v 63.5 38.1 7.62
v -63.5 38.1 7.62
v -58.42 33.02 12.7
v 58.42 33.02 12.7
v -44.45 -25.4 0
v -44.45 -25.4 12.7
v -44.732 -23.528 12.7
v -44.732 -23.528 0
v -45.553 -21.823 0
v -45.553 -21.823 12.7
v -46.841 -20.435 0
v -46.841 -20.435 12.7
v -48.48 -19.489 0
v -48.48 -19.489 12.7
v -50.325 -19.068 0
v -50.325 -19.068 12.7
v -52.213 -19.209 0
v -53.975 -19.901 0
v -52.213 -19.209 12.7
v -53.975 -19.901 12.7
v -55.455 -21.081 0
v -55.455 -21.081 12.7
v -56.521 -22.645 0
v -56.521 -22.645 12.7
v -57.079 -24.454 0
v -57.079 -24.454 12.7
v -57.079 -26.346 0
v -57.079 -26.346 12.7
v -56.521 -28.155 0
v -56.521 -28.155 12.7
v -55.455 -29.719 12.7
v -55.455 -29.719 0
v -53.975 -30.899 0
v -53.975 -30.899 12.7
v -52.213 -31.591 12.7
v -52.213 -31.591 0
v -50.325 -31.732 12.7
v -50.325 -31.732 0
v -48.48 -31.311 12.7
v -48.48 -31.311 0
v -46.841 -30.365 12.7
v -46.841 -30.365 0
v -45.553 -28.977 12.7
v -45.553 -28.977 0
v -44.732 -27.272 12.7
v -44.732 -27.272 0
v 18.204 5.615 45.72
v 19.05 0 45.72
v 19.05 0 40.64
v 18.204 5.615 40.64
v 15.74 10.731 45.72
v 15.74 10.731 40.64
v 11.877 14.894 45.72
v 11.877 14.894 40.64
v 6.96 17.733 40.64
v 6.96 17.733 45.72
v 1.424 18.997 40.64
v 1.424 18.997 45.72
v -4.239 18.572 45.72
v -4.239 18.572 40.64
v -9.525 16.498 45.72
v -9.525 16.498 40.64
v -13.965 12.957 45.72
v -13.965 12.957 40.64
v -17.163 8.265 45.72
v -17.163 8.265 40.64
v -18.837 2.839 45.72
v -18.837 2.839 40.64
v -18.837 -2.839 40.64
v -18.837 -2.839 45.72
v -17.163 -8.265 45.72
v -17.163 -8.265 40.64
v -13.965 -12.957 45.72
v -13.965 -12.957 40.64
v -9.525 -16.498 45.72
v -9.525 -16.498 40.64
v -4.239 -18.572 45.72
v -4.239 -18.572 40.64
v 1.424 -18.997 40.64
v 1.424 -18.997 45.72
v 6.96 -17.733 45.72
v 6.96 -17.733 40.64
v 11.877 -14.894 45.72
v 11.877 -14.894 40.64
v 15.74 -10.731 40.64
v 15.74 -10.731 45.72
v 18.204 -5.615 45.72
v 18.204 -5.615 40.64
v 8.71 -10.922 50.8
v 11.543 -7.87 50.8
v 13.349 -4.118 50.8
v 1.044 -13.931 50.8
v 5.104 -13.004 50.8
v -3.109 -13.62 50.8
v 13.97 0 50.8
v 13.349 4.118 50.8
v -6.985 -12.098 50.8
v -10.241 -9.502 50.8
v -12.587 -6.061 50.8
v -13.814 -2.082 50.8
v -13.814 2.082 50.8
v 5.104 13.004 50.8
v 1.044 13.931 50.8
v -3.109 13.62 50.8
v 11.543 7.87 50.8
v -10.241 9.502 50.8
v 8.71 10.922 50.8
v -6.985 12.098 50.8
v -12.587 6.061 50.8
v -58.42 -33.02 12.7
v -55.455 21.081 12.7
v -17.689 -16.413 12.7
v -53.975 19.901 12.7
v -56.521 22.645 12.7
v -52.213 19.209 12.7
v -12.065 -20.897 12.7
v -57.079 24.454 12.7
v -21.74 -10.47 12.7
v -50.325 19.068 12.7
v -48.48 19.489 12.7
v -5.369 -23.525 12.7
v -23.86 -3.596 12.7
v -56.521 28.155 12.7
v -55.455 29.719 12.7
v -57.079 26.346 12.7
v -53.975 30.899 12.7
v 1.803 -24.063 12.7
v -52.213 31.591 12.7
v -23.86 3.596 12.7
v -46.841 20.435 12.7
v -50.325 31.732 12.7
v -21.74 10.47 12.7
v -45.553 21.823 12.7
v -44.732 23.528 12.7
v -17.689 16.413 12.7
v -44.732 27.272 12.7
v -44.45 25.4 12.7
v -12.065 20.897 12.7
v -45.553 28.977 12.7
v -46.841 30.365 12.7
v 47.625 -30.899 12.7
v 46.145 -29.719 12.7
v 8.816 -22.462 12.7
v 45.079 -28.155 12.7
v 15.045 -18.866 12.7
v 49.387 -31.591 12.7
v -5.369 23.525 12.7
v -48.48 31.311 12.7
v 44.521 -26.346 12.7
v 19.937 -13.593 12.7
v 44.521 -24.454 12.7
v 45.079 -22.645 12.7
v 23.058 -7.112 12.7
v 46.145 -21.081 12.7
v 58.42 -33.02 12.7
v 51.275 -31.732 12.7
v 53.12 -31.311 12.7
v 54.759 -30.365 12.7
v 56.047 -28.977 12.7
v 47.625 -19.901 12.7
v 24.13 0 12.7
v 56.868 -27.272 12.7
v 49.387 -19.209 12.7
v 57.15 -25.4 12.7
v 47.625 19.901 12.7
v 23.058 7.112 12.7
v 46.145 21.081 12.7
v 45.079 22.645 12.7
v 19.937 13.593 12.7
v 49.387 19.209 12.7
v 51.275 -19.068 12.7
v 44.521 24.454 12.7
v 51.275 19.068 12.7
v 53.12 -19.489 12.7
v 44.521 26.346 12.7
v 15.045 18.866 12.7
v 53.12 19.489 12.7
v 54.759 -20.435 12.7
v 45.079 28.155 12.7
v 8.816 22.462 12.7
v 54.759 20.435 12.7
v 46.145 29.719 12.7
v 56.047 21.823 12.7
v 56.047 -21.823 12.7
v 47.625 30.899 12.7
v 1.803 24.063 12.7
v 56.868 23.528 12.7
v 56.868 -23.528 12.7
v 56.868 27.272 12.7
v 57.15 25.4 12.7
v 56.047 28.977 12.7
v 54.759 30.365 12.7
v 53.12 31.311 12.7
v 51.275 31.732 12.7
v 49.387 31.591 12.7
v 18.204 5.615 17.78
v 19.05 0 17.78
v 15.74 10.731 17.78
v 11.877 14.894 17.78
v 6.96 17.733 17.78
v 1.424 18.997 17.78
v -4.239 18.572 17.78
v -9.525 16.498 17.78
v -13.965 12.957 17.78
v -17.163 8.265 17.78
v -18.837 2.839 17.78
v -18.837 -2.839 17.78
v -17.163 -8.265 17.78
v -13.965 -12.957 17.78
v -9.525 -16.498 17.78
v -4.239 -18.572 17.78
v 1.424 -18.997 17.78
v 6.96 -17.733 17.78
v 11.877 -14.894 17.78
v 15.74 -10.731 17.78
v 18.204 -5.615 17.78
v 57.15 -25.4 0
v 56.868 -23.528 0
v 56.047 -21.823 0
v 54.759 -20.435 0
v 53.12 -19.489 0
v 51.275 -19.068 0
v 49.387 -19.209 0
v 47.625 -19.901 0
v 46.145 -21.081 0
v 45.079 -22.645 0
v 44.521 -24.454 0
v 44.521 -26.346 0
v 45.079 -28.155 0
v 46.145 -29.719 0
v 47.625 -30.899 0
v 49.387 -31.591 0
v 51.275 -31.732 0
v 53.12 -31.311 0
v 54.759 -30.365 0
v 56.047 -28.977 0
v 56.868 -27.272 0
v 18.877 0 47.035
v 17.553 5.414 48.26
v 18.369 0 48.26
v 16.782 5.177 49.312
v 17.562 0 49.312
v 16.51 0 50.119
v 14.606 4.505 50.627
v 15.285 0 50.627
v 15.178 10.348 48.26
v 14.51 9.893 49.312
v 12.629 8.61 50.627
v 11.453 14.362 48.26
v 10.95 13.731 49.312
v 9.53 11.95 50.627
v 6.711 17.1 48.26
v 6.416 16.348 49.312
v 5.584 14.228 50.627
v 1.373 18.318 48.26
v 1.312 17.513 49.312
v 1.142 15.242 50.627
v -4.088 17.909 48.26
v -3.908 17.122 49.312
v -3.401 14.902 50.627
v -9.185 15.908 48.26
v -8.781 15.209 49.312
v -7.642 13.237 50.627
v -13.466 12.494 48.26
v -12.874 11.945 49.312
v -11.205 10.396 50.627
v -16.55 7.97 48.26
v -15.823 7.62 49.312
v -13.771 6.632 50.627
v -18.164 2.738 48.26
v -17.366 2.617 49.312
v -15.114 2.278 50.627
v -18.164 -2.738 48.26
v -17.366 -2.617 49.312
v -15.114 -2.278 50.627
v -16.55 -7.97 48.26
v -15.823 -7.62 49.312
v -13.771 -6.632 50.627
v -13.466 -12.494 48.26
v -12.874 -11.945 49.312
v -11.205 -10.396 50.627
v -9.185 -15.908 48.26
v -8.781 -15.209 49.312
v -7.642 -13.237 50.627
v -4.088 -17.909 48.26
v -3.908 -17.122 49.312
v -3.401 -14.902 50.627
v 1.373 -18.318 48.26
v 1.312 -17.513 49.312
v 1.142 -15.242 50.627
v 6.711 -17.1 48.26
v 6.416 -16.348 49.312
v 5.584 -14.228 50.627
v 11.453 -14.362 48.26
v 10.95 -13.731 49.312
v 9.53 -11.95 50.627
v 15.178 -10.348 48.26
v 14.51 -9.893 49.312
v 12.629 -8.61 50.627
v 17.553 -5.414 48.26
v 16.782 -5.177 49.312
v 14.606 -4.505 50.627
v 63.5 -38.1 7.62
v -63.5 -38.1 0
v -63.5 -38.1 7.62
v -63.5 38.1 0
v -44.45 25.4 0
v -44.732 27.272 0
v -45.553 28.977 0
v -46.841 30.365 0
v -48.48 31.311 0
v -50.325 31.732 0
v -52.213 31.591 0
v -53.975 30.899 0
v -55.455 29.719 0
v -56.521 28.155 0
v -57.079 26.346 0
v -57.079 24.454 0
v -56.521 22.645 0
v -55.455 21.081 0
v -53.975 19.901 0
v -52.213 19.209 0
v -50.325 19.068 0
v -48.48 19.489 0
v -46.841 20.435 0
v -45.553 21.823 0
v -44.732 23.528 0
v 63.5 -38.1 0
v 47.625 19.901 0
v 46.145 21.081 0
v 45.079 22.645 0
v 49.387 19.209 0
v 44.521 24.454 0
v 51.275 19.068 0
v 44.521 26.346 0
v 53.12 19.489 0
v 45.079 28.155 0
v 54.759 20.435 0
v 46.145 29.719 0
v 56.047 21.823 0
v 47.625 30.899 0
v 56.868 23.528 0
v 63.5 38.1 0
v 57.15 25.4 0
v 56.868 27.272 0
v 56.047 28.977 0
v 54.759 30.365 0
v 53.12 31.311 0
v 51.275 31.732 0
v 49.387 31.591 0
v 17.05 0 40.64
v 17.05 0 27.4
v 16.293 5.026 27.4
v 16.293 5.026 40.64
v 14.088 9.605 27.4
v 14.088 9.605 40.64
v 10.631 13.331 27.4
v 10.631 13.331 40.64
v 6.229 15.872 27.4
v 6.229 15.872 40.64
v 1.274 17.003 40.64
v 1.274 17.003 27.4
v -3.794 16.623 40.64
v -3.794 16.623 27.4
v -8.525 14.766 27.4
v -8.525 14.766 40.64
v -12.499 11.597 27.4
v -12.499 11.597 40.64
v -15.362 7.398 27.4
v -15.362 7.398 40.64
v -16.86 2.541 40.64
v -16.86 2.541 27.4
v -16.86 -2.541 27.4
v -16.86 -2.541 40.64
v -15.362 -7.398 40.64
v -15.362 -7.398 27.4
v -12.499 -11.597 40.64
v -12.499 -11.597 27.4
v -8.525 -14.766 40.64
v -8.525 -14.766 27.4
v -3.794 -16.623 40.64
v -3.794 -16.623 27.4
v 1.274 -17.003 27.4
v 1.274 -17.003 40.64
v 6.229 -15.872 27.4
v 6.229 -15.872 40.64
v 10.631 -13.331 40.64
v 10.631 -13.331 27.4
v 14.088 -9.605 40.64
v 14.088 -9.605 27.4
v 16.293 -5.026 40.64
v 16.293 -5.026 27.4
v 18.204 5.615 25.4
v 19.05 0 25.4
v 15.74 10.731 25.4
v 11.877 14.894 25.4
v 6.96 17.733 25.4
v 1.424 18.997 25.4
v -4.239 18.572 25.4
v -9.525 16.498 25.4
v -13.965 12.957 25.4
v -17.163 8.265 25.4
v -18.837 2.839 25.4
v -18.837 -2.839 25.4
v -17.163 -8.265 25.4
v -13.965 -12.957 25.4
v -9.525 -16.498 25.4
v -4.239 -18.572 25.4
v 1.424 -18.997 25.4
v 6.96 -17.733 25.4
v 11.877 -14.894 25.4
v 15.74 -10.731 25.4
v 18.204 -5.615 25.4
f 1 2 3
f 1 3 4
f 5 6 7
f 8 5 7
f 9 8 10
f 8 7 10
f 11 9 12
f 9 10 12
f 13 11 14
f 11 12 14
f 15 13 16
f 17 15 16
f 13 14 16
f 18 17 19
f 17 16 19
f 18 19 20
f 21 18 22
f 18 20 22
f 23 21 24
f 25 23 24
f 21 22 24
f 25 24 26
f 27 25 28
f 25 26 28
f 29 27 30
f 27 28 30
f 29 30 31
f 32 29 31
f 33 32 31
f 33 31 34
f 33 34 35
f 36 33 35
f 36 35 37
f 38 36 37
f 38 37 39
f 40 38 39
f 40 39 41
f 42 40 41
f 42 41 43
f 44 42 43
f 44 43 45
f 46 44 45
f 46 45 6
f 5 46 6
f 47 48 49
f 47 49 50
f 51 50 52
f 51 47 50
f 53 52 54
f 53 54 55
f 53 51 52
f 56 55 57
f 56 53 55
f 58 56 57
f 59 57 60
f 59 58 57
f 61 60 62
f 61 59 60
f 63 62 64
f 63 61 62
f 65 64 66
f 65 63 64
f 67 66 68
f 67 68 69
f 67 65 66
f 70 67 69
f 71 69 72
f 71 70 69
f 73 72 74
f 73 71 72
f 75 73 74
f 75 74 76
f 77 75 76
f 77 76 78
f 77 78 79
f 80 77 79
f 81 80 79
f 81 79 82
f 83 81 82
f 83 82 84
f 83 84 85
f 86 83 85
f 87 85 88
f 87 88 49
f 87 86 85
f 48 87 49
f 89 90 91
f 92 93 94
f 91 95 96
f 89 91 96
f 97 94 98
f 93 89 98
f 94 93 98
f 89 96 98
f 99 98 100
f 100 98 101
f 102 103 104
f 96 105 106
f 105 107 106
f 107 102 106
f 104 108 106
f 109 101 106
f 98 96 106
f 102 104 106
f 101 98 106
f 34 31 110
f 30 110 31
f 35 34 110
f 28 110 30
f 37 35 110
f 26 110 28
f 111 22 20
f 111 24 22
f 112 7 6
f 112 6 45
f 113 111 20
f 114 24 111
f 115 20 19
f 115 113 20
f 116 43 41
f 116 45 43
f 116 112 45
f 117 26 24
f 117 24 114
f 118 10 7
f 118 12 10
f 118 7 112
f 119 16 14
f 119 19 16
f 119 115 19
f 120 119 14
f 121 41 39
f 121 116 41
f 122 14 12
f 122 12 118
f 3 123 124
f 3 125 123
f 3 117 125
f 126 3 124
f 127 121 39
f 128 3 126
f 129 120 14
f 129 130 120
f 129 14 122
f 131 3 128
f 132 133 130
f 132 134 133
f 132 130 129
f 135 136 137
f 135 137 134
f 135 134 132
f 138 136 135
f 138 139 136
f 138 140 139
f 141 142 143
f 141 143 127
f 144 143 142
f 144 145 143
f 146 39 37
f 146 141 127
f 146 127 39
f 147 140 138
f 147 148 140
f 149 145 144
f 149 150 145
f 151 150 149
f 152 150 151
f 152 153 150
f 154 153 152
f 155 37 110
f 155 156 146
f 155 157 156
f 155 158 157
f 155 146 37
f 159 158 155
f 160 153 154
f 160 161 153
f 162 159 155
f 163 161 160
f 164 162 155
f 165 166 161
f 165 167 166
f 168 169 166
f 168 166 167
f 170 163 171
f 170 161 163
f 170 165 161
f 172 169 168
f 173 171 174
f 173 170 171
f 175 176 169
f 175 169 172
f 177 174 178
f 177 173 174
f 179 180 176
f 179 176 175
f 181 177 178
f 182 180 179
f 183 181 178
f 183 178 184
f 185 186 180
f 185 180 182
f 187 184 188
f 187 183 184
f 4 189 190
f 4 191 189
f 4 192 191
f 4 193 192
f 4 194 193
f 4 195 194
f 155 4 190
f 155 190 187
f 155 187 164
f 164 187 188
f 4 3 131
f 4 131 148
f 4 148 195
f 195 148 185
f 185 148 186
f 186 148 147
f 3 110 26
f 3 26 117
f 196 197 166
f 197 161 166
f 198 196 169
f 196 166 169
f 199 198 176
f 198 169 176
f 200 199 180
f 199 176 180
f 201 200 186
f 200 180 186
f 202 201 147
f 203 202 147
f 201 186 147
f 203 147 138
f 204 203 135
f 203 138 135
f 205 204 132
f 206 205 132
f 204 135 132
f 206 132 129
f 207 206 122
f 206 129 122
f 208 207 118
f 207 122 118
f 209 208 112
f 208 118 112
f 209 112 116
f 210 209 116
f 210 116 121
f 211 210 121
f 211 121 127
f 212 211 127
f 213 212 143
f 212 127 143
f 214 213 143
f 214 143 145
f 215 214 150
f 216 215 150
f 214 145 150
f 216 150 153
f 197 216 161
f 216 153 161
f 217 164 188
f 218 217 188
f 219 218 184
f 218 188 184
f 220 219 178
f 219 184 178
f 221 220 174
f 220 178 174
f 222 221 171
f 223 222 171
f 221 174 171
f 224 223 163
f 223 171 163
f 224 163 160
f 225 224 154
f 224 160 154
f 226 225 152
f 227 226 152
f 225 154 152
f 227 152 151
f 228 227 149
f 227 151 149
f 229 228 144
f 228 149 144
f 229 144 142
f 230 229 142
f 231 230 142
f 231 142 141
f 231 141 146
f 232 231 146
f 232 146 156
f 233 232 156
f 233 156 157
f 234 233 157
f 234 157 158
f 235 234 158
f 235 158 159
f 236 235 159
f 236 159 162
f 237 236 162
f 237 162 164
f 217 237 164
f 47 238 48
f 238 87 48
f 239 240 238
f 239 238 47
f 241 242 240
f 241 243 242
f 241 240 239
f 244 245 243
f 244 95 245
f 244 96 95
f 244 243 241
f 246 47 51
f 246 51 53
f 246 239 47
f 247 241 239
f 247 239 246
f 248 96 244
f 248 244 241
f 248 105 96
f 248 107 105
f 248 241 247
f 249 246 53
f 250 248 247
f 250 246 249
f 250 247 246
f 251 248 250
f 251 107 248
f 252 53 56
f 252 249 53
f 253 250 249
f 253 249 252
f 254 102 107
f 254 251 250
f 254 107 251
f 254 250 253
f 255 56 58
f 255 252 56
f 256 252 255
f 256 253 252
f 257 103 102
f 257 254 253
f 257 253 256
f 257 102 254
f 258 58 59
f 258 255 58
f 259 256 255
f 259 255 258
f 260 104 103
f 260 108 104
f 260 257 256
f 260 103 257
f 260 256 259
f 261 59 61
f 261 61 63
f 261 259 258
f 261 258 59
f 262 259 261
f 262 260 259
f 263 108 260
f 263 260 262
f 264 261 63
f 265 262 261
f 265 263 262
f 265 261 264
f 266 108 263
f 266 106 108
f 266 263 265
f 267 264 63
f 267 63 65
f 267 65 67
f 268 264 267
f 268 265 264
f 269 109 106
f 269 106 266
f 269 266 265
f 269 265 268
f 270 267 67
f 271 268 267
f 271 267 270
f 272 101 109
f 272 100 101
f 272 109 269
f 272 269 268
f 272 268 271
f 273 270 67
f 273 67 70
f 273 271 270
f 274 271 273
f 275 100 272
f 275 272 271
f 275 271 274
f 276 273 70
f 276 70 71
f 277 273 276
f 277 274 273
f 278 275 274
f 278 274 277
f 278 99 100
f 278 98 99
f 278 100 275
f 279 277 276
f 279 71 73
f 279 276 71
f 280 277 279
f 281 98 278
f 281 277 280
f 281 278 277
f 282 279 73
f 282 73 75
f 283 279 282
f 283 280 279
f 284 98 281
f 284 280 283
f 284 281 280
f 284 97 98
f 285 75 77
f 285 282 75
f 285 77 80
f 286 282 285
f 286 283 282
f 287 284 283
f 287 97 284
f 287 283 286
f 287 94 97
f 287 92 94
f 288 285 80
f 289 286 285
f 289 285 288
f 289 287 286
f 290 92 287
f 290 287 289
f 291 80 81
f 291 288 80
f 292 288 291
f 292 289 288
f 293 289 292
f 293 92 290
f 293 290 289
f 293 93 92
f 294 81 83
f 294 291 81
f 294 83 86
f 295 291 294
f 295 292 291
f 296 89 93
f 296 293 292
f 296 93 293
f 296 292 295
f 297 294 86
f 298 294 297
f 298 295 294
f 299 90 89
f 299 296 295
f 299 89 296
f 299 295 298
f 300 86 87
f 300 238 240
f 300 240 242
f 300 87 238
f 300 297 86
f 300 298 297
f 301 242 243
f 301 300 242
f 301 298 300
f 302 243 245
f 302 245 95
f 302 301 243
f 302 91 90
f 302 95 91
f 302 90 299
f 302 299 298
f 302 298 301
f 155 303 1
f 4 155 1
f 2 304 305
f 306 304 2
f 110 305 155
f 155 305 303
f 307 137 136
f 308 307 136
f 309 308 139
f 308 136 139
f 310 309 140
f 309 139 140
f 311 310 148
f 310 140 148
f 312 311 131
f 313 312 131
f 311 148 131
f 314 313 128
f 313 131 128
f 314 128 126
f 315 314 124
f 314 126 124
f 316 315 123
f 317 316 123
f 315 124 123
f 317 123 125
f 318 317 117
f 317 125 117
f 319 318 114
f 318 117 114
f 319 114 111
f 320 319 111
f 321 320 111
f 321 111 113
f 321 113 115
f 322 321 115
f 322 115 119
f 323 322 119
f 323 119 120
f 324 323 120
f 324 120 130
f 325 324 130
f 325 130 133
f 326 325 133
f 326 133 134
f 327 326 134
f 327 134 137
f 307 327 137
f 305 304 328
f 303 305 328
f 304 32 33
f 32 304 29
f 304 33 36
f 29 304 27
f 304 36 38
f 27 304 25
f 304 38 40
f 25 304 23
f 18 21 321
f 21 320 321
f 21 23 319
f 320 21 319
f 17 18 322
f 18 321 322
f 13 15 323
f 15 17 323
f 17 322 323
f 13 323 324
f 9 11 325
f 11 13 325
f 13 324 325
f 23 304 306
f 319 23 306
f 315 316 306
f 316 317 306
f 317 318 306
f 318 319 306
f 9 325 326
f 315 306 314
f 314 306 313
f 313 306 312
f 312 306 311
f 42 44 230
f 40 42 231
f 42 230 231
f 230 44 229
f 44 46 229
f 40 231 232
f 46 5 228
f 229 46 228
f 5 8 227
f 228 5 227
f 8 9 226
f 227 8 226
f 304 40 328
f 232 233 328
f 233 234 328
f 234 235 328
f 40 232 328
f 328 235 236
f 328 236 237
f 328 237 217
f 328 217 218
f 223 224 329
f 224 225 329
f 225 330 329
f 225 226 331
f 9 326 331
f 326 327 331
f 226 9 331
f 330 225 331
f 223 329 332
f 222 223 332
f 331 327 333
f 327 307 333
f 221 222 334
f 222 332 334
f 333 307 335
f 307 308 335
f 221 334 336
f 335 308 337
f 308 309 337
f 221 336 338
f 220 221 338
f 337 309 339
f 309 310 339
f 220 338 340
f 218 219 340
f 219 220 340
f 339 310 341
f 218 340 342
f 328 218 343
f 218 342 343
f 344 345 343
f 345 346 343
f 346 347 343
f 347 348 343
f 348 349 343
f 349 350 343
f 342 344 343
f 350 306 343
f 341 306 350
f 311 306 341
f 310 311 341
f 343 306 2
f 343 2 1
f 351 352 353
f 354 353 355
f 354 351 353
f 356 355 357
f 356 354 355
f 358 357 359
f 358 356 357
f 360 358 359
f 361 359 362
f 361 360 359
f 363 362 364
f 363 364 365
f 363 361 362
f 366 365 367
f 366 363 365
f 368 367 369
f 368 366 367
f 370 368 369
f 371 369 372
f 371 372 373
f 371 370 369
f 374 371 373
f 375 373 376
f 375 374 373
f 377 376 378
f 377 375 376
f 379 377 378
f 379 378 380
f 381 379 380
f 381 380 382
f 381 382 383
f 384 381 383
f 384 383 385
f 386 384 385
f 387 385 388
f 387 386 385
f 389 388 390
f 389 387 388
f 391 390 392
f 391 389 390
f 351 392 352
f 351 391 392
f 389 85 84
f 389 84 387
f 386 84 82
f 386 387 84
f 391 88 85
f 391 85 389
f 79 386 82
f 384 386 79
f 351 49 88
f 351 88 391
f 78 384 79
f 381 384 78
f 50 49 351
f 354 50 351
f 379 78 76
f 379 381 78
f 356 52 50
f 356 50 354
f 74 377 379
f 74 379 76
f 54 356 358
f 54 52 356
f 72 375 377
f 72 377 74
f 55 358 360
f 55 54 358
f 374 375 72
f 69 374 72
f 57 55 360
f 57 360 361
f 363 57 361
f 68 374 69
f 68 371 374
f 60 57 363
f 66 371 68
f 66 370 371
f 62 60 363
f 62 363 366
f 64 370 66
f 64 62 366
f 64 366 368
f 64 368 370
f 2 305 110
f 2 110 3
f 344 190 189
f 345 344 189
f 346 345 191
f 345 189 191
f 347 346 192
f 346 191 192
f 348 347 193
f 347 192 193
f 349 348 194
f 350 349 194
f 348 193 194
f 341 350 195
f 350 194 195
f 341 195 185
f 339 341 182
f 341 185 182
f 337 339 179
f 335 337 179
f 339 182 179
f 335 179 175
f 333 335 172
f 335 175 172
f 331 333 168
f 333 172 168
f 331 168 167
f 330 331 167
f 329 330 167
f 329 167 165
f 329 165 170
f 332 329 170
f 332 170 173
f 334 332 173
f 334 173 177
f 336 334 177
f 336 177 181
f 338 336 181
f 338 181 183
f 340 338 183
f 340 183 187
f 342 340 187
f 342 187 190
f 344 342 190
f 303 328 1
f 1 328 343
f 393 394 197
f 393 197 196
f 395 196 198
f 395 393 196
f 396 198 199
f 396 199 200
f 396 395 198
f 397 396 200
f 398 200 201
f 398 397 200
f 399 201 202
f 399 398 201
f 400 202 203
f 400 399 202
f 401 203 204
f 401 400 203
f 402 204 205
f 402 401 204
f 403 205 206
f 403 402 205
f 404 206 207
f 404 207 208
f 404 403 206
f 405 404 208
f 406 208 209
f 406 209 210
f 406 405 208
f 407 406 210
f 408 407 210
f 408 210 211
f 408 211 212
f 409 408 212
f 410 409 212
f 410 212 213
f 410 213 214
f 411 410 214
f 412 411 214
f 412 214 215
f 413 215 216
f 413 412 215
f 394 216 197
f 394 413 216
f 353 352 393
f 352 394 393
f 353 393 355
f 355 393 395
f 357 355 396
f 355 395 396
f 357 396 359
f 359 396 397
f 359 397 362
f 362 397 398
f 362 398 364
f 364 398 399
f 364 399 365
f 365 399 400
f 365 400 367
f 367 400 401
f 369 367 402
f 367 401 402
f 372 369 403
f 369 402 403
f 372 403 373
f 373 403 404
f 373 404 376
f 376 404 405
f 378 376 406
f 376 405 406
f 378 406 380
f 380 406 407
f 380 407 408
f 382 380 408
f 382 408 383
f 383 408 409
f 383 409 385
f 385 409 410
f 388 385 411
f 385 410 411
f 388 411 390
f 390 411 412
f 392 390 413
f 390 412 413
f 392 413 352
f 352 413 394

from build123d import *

# Parameters (mm, degrees)
F0_W        = 127
F0_H        = 76.2
F1_DEPTH    = 12.7
F2_R        = 6.35
F3_DEPTH    = 12.701
F4_W        = 19.05
F4_H        = 38.1
F6_W        = 6.35
F6_H        = 10.16
F8_R        = 5.08
F9_S7_R     = 17.0504603439
F9_T8_DEPTH = 29
F10_SIZE    = 5.08


# Not quite as in the source:
# - a fillet or chamfer that OpenCascade refuses, or shapes differently, is made with other operations: its cross-section is extruded or revolved along the edge and cut away or added


with BuildPart() as f1:
    # F0 (on Top) → F1 (new body)
    with BuildSketch(Plane.XY):
        Rectangle(F0_W, F0_H)
    extrude(amount=F1_DEPTH)

    # F2 (on face) → F3 (cut, through all)
    with BuildSketch(Plane.XY.offset(12.7)):
        with Locations((50.8, -25.4)):
            Circle(F2_R)
        with Locations((50.8, 25.4)):
            Circle(F2_R)
        with Locations((-50.8, 25.4)):
            Circle(F2_R)
        with Locations((-50.8, -25.4)):
            Circle(F2_R)
    extrude(amount=-F3_DEPTH, mode=Mode.SUBTRACT)

    # F4 (on Front) → F5 (revolve)
    with BuildSketch(Plane.XZ):
        with Locations((9.525, 31.75)):
            Rectangle(F4_W, F4_H)
    revolve(axis=Axis((0, 0, 31.75), (0, 0, 1)))

    # F6 (on Front) → F7 (revolve, cut)
    with BuildSketch(Plane.XZ):
        with Locations((20.2254603439, 35.56)):
            Rectangle(F6_W, F6_H)
    revolve(axis=Axis((0, 0, 50.8), (0, 0, 1)), mode=Mode.SUBTRACT)

    # F8
    f8_edges = [f1.edges().sort_by_distance(p)[0] for p in [
        (-19.05, 0, 50.8),
    ]]
    fillet(f8_edges, radius=F8_R)

    # F9: chamfer of 5.08 on 3 edges, made by hand

    # F9_s1 → F9_t2 (revolve)
    with BuildSketch(Plane.XZ):
        Polygon((19.05, 17.78), (24.13, 12.7), (19.05, 12.7), align=None)
    revolve(axis=Axis((0, 0, 12.7), (0, 0, 1)))


with BuildPart() as f9_tool4:
    # F9_s5 → F9_t6 (revolve)
    with BuildSketch(Plane.XZ):
        Polygon((13.97, 30.48), (19.05, 25.4), (19.05, 30.48), align=None)
    revolve(axis=Axis((0, 0, 30.48), (0, 0, 1)))

    # F9_s7 → F9_t8 (cut, symmetric)
    with BuildSketch(Plane.XY.offset(27.9)):
        Circle(F9_S7_R)
    extrude(amount=F9_T8_DEPTH, both=True, mode=Mode.SUBTRACT)


with BuildPart() as f1_1:
    add(f1.part)

    # F9_t3: cut F9_tool4
    add(f9_tool4.part, mode=Mode.SUBTRACT)

    # F10
    f10_edges = [f1_1.edges().sort_by_distance(p)[0] for p in [
        (0, -38.1, 12.7),
        (63.5, 0, 12.7),
        (0, 38.1, 12.7),
        (-63.5, 0, 12.7),
    ]]
    chamfer(f10_edges, length=F10_SIZE)


solid = f1_1.part
